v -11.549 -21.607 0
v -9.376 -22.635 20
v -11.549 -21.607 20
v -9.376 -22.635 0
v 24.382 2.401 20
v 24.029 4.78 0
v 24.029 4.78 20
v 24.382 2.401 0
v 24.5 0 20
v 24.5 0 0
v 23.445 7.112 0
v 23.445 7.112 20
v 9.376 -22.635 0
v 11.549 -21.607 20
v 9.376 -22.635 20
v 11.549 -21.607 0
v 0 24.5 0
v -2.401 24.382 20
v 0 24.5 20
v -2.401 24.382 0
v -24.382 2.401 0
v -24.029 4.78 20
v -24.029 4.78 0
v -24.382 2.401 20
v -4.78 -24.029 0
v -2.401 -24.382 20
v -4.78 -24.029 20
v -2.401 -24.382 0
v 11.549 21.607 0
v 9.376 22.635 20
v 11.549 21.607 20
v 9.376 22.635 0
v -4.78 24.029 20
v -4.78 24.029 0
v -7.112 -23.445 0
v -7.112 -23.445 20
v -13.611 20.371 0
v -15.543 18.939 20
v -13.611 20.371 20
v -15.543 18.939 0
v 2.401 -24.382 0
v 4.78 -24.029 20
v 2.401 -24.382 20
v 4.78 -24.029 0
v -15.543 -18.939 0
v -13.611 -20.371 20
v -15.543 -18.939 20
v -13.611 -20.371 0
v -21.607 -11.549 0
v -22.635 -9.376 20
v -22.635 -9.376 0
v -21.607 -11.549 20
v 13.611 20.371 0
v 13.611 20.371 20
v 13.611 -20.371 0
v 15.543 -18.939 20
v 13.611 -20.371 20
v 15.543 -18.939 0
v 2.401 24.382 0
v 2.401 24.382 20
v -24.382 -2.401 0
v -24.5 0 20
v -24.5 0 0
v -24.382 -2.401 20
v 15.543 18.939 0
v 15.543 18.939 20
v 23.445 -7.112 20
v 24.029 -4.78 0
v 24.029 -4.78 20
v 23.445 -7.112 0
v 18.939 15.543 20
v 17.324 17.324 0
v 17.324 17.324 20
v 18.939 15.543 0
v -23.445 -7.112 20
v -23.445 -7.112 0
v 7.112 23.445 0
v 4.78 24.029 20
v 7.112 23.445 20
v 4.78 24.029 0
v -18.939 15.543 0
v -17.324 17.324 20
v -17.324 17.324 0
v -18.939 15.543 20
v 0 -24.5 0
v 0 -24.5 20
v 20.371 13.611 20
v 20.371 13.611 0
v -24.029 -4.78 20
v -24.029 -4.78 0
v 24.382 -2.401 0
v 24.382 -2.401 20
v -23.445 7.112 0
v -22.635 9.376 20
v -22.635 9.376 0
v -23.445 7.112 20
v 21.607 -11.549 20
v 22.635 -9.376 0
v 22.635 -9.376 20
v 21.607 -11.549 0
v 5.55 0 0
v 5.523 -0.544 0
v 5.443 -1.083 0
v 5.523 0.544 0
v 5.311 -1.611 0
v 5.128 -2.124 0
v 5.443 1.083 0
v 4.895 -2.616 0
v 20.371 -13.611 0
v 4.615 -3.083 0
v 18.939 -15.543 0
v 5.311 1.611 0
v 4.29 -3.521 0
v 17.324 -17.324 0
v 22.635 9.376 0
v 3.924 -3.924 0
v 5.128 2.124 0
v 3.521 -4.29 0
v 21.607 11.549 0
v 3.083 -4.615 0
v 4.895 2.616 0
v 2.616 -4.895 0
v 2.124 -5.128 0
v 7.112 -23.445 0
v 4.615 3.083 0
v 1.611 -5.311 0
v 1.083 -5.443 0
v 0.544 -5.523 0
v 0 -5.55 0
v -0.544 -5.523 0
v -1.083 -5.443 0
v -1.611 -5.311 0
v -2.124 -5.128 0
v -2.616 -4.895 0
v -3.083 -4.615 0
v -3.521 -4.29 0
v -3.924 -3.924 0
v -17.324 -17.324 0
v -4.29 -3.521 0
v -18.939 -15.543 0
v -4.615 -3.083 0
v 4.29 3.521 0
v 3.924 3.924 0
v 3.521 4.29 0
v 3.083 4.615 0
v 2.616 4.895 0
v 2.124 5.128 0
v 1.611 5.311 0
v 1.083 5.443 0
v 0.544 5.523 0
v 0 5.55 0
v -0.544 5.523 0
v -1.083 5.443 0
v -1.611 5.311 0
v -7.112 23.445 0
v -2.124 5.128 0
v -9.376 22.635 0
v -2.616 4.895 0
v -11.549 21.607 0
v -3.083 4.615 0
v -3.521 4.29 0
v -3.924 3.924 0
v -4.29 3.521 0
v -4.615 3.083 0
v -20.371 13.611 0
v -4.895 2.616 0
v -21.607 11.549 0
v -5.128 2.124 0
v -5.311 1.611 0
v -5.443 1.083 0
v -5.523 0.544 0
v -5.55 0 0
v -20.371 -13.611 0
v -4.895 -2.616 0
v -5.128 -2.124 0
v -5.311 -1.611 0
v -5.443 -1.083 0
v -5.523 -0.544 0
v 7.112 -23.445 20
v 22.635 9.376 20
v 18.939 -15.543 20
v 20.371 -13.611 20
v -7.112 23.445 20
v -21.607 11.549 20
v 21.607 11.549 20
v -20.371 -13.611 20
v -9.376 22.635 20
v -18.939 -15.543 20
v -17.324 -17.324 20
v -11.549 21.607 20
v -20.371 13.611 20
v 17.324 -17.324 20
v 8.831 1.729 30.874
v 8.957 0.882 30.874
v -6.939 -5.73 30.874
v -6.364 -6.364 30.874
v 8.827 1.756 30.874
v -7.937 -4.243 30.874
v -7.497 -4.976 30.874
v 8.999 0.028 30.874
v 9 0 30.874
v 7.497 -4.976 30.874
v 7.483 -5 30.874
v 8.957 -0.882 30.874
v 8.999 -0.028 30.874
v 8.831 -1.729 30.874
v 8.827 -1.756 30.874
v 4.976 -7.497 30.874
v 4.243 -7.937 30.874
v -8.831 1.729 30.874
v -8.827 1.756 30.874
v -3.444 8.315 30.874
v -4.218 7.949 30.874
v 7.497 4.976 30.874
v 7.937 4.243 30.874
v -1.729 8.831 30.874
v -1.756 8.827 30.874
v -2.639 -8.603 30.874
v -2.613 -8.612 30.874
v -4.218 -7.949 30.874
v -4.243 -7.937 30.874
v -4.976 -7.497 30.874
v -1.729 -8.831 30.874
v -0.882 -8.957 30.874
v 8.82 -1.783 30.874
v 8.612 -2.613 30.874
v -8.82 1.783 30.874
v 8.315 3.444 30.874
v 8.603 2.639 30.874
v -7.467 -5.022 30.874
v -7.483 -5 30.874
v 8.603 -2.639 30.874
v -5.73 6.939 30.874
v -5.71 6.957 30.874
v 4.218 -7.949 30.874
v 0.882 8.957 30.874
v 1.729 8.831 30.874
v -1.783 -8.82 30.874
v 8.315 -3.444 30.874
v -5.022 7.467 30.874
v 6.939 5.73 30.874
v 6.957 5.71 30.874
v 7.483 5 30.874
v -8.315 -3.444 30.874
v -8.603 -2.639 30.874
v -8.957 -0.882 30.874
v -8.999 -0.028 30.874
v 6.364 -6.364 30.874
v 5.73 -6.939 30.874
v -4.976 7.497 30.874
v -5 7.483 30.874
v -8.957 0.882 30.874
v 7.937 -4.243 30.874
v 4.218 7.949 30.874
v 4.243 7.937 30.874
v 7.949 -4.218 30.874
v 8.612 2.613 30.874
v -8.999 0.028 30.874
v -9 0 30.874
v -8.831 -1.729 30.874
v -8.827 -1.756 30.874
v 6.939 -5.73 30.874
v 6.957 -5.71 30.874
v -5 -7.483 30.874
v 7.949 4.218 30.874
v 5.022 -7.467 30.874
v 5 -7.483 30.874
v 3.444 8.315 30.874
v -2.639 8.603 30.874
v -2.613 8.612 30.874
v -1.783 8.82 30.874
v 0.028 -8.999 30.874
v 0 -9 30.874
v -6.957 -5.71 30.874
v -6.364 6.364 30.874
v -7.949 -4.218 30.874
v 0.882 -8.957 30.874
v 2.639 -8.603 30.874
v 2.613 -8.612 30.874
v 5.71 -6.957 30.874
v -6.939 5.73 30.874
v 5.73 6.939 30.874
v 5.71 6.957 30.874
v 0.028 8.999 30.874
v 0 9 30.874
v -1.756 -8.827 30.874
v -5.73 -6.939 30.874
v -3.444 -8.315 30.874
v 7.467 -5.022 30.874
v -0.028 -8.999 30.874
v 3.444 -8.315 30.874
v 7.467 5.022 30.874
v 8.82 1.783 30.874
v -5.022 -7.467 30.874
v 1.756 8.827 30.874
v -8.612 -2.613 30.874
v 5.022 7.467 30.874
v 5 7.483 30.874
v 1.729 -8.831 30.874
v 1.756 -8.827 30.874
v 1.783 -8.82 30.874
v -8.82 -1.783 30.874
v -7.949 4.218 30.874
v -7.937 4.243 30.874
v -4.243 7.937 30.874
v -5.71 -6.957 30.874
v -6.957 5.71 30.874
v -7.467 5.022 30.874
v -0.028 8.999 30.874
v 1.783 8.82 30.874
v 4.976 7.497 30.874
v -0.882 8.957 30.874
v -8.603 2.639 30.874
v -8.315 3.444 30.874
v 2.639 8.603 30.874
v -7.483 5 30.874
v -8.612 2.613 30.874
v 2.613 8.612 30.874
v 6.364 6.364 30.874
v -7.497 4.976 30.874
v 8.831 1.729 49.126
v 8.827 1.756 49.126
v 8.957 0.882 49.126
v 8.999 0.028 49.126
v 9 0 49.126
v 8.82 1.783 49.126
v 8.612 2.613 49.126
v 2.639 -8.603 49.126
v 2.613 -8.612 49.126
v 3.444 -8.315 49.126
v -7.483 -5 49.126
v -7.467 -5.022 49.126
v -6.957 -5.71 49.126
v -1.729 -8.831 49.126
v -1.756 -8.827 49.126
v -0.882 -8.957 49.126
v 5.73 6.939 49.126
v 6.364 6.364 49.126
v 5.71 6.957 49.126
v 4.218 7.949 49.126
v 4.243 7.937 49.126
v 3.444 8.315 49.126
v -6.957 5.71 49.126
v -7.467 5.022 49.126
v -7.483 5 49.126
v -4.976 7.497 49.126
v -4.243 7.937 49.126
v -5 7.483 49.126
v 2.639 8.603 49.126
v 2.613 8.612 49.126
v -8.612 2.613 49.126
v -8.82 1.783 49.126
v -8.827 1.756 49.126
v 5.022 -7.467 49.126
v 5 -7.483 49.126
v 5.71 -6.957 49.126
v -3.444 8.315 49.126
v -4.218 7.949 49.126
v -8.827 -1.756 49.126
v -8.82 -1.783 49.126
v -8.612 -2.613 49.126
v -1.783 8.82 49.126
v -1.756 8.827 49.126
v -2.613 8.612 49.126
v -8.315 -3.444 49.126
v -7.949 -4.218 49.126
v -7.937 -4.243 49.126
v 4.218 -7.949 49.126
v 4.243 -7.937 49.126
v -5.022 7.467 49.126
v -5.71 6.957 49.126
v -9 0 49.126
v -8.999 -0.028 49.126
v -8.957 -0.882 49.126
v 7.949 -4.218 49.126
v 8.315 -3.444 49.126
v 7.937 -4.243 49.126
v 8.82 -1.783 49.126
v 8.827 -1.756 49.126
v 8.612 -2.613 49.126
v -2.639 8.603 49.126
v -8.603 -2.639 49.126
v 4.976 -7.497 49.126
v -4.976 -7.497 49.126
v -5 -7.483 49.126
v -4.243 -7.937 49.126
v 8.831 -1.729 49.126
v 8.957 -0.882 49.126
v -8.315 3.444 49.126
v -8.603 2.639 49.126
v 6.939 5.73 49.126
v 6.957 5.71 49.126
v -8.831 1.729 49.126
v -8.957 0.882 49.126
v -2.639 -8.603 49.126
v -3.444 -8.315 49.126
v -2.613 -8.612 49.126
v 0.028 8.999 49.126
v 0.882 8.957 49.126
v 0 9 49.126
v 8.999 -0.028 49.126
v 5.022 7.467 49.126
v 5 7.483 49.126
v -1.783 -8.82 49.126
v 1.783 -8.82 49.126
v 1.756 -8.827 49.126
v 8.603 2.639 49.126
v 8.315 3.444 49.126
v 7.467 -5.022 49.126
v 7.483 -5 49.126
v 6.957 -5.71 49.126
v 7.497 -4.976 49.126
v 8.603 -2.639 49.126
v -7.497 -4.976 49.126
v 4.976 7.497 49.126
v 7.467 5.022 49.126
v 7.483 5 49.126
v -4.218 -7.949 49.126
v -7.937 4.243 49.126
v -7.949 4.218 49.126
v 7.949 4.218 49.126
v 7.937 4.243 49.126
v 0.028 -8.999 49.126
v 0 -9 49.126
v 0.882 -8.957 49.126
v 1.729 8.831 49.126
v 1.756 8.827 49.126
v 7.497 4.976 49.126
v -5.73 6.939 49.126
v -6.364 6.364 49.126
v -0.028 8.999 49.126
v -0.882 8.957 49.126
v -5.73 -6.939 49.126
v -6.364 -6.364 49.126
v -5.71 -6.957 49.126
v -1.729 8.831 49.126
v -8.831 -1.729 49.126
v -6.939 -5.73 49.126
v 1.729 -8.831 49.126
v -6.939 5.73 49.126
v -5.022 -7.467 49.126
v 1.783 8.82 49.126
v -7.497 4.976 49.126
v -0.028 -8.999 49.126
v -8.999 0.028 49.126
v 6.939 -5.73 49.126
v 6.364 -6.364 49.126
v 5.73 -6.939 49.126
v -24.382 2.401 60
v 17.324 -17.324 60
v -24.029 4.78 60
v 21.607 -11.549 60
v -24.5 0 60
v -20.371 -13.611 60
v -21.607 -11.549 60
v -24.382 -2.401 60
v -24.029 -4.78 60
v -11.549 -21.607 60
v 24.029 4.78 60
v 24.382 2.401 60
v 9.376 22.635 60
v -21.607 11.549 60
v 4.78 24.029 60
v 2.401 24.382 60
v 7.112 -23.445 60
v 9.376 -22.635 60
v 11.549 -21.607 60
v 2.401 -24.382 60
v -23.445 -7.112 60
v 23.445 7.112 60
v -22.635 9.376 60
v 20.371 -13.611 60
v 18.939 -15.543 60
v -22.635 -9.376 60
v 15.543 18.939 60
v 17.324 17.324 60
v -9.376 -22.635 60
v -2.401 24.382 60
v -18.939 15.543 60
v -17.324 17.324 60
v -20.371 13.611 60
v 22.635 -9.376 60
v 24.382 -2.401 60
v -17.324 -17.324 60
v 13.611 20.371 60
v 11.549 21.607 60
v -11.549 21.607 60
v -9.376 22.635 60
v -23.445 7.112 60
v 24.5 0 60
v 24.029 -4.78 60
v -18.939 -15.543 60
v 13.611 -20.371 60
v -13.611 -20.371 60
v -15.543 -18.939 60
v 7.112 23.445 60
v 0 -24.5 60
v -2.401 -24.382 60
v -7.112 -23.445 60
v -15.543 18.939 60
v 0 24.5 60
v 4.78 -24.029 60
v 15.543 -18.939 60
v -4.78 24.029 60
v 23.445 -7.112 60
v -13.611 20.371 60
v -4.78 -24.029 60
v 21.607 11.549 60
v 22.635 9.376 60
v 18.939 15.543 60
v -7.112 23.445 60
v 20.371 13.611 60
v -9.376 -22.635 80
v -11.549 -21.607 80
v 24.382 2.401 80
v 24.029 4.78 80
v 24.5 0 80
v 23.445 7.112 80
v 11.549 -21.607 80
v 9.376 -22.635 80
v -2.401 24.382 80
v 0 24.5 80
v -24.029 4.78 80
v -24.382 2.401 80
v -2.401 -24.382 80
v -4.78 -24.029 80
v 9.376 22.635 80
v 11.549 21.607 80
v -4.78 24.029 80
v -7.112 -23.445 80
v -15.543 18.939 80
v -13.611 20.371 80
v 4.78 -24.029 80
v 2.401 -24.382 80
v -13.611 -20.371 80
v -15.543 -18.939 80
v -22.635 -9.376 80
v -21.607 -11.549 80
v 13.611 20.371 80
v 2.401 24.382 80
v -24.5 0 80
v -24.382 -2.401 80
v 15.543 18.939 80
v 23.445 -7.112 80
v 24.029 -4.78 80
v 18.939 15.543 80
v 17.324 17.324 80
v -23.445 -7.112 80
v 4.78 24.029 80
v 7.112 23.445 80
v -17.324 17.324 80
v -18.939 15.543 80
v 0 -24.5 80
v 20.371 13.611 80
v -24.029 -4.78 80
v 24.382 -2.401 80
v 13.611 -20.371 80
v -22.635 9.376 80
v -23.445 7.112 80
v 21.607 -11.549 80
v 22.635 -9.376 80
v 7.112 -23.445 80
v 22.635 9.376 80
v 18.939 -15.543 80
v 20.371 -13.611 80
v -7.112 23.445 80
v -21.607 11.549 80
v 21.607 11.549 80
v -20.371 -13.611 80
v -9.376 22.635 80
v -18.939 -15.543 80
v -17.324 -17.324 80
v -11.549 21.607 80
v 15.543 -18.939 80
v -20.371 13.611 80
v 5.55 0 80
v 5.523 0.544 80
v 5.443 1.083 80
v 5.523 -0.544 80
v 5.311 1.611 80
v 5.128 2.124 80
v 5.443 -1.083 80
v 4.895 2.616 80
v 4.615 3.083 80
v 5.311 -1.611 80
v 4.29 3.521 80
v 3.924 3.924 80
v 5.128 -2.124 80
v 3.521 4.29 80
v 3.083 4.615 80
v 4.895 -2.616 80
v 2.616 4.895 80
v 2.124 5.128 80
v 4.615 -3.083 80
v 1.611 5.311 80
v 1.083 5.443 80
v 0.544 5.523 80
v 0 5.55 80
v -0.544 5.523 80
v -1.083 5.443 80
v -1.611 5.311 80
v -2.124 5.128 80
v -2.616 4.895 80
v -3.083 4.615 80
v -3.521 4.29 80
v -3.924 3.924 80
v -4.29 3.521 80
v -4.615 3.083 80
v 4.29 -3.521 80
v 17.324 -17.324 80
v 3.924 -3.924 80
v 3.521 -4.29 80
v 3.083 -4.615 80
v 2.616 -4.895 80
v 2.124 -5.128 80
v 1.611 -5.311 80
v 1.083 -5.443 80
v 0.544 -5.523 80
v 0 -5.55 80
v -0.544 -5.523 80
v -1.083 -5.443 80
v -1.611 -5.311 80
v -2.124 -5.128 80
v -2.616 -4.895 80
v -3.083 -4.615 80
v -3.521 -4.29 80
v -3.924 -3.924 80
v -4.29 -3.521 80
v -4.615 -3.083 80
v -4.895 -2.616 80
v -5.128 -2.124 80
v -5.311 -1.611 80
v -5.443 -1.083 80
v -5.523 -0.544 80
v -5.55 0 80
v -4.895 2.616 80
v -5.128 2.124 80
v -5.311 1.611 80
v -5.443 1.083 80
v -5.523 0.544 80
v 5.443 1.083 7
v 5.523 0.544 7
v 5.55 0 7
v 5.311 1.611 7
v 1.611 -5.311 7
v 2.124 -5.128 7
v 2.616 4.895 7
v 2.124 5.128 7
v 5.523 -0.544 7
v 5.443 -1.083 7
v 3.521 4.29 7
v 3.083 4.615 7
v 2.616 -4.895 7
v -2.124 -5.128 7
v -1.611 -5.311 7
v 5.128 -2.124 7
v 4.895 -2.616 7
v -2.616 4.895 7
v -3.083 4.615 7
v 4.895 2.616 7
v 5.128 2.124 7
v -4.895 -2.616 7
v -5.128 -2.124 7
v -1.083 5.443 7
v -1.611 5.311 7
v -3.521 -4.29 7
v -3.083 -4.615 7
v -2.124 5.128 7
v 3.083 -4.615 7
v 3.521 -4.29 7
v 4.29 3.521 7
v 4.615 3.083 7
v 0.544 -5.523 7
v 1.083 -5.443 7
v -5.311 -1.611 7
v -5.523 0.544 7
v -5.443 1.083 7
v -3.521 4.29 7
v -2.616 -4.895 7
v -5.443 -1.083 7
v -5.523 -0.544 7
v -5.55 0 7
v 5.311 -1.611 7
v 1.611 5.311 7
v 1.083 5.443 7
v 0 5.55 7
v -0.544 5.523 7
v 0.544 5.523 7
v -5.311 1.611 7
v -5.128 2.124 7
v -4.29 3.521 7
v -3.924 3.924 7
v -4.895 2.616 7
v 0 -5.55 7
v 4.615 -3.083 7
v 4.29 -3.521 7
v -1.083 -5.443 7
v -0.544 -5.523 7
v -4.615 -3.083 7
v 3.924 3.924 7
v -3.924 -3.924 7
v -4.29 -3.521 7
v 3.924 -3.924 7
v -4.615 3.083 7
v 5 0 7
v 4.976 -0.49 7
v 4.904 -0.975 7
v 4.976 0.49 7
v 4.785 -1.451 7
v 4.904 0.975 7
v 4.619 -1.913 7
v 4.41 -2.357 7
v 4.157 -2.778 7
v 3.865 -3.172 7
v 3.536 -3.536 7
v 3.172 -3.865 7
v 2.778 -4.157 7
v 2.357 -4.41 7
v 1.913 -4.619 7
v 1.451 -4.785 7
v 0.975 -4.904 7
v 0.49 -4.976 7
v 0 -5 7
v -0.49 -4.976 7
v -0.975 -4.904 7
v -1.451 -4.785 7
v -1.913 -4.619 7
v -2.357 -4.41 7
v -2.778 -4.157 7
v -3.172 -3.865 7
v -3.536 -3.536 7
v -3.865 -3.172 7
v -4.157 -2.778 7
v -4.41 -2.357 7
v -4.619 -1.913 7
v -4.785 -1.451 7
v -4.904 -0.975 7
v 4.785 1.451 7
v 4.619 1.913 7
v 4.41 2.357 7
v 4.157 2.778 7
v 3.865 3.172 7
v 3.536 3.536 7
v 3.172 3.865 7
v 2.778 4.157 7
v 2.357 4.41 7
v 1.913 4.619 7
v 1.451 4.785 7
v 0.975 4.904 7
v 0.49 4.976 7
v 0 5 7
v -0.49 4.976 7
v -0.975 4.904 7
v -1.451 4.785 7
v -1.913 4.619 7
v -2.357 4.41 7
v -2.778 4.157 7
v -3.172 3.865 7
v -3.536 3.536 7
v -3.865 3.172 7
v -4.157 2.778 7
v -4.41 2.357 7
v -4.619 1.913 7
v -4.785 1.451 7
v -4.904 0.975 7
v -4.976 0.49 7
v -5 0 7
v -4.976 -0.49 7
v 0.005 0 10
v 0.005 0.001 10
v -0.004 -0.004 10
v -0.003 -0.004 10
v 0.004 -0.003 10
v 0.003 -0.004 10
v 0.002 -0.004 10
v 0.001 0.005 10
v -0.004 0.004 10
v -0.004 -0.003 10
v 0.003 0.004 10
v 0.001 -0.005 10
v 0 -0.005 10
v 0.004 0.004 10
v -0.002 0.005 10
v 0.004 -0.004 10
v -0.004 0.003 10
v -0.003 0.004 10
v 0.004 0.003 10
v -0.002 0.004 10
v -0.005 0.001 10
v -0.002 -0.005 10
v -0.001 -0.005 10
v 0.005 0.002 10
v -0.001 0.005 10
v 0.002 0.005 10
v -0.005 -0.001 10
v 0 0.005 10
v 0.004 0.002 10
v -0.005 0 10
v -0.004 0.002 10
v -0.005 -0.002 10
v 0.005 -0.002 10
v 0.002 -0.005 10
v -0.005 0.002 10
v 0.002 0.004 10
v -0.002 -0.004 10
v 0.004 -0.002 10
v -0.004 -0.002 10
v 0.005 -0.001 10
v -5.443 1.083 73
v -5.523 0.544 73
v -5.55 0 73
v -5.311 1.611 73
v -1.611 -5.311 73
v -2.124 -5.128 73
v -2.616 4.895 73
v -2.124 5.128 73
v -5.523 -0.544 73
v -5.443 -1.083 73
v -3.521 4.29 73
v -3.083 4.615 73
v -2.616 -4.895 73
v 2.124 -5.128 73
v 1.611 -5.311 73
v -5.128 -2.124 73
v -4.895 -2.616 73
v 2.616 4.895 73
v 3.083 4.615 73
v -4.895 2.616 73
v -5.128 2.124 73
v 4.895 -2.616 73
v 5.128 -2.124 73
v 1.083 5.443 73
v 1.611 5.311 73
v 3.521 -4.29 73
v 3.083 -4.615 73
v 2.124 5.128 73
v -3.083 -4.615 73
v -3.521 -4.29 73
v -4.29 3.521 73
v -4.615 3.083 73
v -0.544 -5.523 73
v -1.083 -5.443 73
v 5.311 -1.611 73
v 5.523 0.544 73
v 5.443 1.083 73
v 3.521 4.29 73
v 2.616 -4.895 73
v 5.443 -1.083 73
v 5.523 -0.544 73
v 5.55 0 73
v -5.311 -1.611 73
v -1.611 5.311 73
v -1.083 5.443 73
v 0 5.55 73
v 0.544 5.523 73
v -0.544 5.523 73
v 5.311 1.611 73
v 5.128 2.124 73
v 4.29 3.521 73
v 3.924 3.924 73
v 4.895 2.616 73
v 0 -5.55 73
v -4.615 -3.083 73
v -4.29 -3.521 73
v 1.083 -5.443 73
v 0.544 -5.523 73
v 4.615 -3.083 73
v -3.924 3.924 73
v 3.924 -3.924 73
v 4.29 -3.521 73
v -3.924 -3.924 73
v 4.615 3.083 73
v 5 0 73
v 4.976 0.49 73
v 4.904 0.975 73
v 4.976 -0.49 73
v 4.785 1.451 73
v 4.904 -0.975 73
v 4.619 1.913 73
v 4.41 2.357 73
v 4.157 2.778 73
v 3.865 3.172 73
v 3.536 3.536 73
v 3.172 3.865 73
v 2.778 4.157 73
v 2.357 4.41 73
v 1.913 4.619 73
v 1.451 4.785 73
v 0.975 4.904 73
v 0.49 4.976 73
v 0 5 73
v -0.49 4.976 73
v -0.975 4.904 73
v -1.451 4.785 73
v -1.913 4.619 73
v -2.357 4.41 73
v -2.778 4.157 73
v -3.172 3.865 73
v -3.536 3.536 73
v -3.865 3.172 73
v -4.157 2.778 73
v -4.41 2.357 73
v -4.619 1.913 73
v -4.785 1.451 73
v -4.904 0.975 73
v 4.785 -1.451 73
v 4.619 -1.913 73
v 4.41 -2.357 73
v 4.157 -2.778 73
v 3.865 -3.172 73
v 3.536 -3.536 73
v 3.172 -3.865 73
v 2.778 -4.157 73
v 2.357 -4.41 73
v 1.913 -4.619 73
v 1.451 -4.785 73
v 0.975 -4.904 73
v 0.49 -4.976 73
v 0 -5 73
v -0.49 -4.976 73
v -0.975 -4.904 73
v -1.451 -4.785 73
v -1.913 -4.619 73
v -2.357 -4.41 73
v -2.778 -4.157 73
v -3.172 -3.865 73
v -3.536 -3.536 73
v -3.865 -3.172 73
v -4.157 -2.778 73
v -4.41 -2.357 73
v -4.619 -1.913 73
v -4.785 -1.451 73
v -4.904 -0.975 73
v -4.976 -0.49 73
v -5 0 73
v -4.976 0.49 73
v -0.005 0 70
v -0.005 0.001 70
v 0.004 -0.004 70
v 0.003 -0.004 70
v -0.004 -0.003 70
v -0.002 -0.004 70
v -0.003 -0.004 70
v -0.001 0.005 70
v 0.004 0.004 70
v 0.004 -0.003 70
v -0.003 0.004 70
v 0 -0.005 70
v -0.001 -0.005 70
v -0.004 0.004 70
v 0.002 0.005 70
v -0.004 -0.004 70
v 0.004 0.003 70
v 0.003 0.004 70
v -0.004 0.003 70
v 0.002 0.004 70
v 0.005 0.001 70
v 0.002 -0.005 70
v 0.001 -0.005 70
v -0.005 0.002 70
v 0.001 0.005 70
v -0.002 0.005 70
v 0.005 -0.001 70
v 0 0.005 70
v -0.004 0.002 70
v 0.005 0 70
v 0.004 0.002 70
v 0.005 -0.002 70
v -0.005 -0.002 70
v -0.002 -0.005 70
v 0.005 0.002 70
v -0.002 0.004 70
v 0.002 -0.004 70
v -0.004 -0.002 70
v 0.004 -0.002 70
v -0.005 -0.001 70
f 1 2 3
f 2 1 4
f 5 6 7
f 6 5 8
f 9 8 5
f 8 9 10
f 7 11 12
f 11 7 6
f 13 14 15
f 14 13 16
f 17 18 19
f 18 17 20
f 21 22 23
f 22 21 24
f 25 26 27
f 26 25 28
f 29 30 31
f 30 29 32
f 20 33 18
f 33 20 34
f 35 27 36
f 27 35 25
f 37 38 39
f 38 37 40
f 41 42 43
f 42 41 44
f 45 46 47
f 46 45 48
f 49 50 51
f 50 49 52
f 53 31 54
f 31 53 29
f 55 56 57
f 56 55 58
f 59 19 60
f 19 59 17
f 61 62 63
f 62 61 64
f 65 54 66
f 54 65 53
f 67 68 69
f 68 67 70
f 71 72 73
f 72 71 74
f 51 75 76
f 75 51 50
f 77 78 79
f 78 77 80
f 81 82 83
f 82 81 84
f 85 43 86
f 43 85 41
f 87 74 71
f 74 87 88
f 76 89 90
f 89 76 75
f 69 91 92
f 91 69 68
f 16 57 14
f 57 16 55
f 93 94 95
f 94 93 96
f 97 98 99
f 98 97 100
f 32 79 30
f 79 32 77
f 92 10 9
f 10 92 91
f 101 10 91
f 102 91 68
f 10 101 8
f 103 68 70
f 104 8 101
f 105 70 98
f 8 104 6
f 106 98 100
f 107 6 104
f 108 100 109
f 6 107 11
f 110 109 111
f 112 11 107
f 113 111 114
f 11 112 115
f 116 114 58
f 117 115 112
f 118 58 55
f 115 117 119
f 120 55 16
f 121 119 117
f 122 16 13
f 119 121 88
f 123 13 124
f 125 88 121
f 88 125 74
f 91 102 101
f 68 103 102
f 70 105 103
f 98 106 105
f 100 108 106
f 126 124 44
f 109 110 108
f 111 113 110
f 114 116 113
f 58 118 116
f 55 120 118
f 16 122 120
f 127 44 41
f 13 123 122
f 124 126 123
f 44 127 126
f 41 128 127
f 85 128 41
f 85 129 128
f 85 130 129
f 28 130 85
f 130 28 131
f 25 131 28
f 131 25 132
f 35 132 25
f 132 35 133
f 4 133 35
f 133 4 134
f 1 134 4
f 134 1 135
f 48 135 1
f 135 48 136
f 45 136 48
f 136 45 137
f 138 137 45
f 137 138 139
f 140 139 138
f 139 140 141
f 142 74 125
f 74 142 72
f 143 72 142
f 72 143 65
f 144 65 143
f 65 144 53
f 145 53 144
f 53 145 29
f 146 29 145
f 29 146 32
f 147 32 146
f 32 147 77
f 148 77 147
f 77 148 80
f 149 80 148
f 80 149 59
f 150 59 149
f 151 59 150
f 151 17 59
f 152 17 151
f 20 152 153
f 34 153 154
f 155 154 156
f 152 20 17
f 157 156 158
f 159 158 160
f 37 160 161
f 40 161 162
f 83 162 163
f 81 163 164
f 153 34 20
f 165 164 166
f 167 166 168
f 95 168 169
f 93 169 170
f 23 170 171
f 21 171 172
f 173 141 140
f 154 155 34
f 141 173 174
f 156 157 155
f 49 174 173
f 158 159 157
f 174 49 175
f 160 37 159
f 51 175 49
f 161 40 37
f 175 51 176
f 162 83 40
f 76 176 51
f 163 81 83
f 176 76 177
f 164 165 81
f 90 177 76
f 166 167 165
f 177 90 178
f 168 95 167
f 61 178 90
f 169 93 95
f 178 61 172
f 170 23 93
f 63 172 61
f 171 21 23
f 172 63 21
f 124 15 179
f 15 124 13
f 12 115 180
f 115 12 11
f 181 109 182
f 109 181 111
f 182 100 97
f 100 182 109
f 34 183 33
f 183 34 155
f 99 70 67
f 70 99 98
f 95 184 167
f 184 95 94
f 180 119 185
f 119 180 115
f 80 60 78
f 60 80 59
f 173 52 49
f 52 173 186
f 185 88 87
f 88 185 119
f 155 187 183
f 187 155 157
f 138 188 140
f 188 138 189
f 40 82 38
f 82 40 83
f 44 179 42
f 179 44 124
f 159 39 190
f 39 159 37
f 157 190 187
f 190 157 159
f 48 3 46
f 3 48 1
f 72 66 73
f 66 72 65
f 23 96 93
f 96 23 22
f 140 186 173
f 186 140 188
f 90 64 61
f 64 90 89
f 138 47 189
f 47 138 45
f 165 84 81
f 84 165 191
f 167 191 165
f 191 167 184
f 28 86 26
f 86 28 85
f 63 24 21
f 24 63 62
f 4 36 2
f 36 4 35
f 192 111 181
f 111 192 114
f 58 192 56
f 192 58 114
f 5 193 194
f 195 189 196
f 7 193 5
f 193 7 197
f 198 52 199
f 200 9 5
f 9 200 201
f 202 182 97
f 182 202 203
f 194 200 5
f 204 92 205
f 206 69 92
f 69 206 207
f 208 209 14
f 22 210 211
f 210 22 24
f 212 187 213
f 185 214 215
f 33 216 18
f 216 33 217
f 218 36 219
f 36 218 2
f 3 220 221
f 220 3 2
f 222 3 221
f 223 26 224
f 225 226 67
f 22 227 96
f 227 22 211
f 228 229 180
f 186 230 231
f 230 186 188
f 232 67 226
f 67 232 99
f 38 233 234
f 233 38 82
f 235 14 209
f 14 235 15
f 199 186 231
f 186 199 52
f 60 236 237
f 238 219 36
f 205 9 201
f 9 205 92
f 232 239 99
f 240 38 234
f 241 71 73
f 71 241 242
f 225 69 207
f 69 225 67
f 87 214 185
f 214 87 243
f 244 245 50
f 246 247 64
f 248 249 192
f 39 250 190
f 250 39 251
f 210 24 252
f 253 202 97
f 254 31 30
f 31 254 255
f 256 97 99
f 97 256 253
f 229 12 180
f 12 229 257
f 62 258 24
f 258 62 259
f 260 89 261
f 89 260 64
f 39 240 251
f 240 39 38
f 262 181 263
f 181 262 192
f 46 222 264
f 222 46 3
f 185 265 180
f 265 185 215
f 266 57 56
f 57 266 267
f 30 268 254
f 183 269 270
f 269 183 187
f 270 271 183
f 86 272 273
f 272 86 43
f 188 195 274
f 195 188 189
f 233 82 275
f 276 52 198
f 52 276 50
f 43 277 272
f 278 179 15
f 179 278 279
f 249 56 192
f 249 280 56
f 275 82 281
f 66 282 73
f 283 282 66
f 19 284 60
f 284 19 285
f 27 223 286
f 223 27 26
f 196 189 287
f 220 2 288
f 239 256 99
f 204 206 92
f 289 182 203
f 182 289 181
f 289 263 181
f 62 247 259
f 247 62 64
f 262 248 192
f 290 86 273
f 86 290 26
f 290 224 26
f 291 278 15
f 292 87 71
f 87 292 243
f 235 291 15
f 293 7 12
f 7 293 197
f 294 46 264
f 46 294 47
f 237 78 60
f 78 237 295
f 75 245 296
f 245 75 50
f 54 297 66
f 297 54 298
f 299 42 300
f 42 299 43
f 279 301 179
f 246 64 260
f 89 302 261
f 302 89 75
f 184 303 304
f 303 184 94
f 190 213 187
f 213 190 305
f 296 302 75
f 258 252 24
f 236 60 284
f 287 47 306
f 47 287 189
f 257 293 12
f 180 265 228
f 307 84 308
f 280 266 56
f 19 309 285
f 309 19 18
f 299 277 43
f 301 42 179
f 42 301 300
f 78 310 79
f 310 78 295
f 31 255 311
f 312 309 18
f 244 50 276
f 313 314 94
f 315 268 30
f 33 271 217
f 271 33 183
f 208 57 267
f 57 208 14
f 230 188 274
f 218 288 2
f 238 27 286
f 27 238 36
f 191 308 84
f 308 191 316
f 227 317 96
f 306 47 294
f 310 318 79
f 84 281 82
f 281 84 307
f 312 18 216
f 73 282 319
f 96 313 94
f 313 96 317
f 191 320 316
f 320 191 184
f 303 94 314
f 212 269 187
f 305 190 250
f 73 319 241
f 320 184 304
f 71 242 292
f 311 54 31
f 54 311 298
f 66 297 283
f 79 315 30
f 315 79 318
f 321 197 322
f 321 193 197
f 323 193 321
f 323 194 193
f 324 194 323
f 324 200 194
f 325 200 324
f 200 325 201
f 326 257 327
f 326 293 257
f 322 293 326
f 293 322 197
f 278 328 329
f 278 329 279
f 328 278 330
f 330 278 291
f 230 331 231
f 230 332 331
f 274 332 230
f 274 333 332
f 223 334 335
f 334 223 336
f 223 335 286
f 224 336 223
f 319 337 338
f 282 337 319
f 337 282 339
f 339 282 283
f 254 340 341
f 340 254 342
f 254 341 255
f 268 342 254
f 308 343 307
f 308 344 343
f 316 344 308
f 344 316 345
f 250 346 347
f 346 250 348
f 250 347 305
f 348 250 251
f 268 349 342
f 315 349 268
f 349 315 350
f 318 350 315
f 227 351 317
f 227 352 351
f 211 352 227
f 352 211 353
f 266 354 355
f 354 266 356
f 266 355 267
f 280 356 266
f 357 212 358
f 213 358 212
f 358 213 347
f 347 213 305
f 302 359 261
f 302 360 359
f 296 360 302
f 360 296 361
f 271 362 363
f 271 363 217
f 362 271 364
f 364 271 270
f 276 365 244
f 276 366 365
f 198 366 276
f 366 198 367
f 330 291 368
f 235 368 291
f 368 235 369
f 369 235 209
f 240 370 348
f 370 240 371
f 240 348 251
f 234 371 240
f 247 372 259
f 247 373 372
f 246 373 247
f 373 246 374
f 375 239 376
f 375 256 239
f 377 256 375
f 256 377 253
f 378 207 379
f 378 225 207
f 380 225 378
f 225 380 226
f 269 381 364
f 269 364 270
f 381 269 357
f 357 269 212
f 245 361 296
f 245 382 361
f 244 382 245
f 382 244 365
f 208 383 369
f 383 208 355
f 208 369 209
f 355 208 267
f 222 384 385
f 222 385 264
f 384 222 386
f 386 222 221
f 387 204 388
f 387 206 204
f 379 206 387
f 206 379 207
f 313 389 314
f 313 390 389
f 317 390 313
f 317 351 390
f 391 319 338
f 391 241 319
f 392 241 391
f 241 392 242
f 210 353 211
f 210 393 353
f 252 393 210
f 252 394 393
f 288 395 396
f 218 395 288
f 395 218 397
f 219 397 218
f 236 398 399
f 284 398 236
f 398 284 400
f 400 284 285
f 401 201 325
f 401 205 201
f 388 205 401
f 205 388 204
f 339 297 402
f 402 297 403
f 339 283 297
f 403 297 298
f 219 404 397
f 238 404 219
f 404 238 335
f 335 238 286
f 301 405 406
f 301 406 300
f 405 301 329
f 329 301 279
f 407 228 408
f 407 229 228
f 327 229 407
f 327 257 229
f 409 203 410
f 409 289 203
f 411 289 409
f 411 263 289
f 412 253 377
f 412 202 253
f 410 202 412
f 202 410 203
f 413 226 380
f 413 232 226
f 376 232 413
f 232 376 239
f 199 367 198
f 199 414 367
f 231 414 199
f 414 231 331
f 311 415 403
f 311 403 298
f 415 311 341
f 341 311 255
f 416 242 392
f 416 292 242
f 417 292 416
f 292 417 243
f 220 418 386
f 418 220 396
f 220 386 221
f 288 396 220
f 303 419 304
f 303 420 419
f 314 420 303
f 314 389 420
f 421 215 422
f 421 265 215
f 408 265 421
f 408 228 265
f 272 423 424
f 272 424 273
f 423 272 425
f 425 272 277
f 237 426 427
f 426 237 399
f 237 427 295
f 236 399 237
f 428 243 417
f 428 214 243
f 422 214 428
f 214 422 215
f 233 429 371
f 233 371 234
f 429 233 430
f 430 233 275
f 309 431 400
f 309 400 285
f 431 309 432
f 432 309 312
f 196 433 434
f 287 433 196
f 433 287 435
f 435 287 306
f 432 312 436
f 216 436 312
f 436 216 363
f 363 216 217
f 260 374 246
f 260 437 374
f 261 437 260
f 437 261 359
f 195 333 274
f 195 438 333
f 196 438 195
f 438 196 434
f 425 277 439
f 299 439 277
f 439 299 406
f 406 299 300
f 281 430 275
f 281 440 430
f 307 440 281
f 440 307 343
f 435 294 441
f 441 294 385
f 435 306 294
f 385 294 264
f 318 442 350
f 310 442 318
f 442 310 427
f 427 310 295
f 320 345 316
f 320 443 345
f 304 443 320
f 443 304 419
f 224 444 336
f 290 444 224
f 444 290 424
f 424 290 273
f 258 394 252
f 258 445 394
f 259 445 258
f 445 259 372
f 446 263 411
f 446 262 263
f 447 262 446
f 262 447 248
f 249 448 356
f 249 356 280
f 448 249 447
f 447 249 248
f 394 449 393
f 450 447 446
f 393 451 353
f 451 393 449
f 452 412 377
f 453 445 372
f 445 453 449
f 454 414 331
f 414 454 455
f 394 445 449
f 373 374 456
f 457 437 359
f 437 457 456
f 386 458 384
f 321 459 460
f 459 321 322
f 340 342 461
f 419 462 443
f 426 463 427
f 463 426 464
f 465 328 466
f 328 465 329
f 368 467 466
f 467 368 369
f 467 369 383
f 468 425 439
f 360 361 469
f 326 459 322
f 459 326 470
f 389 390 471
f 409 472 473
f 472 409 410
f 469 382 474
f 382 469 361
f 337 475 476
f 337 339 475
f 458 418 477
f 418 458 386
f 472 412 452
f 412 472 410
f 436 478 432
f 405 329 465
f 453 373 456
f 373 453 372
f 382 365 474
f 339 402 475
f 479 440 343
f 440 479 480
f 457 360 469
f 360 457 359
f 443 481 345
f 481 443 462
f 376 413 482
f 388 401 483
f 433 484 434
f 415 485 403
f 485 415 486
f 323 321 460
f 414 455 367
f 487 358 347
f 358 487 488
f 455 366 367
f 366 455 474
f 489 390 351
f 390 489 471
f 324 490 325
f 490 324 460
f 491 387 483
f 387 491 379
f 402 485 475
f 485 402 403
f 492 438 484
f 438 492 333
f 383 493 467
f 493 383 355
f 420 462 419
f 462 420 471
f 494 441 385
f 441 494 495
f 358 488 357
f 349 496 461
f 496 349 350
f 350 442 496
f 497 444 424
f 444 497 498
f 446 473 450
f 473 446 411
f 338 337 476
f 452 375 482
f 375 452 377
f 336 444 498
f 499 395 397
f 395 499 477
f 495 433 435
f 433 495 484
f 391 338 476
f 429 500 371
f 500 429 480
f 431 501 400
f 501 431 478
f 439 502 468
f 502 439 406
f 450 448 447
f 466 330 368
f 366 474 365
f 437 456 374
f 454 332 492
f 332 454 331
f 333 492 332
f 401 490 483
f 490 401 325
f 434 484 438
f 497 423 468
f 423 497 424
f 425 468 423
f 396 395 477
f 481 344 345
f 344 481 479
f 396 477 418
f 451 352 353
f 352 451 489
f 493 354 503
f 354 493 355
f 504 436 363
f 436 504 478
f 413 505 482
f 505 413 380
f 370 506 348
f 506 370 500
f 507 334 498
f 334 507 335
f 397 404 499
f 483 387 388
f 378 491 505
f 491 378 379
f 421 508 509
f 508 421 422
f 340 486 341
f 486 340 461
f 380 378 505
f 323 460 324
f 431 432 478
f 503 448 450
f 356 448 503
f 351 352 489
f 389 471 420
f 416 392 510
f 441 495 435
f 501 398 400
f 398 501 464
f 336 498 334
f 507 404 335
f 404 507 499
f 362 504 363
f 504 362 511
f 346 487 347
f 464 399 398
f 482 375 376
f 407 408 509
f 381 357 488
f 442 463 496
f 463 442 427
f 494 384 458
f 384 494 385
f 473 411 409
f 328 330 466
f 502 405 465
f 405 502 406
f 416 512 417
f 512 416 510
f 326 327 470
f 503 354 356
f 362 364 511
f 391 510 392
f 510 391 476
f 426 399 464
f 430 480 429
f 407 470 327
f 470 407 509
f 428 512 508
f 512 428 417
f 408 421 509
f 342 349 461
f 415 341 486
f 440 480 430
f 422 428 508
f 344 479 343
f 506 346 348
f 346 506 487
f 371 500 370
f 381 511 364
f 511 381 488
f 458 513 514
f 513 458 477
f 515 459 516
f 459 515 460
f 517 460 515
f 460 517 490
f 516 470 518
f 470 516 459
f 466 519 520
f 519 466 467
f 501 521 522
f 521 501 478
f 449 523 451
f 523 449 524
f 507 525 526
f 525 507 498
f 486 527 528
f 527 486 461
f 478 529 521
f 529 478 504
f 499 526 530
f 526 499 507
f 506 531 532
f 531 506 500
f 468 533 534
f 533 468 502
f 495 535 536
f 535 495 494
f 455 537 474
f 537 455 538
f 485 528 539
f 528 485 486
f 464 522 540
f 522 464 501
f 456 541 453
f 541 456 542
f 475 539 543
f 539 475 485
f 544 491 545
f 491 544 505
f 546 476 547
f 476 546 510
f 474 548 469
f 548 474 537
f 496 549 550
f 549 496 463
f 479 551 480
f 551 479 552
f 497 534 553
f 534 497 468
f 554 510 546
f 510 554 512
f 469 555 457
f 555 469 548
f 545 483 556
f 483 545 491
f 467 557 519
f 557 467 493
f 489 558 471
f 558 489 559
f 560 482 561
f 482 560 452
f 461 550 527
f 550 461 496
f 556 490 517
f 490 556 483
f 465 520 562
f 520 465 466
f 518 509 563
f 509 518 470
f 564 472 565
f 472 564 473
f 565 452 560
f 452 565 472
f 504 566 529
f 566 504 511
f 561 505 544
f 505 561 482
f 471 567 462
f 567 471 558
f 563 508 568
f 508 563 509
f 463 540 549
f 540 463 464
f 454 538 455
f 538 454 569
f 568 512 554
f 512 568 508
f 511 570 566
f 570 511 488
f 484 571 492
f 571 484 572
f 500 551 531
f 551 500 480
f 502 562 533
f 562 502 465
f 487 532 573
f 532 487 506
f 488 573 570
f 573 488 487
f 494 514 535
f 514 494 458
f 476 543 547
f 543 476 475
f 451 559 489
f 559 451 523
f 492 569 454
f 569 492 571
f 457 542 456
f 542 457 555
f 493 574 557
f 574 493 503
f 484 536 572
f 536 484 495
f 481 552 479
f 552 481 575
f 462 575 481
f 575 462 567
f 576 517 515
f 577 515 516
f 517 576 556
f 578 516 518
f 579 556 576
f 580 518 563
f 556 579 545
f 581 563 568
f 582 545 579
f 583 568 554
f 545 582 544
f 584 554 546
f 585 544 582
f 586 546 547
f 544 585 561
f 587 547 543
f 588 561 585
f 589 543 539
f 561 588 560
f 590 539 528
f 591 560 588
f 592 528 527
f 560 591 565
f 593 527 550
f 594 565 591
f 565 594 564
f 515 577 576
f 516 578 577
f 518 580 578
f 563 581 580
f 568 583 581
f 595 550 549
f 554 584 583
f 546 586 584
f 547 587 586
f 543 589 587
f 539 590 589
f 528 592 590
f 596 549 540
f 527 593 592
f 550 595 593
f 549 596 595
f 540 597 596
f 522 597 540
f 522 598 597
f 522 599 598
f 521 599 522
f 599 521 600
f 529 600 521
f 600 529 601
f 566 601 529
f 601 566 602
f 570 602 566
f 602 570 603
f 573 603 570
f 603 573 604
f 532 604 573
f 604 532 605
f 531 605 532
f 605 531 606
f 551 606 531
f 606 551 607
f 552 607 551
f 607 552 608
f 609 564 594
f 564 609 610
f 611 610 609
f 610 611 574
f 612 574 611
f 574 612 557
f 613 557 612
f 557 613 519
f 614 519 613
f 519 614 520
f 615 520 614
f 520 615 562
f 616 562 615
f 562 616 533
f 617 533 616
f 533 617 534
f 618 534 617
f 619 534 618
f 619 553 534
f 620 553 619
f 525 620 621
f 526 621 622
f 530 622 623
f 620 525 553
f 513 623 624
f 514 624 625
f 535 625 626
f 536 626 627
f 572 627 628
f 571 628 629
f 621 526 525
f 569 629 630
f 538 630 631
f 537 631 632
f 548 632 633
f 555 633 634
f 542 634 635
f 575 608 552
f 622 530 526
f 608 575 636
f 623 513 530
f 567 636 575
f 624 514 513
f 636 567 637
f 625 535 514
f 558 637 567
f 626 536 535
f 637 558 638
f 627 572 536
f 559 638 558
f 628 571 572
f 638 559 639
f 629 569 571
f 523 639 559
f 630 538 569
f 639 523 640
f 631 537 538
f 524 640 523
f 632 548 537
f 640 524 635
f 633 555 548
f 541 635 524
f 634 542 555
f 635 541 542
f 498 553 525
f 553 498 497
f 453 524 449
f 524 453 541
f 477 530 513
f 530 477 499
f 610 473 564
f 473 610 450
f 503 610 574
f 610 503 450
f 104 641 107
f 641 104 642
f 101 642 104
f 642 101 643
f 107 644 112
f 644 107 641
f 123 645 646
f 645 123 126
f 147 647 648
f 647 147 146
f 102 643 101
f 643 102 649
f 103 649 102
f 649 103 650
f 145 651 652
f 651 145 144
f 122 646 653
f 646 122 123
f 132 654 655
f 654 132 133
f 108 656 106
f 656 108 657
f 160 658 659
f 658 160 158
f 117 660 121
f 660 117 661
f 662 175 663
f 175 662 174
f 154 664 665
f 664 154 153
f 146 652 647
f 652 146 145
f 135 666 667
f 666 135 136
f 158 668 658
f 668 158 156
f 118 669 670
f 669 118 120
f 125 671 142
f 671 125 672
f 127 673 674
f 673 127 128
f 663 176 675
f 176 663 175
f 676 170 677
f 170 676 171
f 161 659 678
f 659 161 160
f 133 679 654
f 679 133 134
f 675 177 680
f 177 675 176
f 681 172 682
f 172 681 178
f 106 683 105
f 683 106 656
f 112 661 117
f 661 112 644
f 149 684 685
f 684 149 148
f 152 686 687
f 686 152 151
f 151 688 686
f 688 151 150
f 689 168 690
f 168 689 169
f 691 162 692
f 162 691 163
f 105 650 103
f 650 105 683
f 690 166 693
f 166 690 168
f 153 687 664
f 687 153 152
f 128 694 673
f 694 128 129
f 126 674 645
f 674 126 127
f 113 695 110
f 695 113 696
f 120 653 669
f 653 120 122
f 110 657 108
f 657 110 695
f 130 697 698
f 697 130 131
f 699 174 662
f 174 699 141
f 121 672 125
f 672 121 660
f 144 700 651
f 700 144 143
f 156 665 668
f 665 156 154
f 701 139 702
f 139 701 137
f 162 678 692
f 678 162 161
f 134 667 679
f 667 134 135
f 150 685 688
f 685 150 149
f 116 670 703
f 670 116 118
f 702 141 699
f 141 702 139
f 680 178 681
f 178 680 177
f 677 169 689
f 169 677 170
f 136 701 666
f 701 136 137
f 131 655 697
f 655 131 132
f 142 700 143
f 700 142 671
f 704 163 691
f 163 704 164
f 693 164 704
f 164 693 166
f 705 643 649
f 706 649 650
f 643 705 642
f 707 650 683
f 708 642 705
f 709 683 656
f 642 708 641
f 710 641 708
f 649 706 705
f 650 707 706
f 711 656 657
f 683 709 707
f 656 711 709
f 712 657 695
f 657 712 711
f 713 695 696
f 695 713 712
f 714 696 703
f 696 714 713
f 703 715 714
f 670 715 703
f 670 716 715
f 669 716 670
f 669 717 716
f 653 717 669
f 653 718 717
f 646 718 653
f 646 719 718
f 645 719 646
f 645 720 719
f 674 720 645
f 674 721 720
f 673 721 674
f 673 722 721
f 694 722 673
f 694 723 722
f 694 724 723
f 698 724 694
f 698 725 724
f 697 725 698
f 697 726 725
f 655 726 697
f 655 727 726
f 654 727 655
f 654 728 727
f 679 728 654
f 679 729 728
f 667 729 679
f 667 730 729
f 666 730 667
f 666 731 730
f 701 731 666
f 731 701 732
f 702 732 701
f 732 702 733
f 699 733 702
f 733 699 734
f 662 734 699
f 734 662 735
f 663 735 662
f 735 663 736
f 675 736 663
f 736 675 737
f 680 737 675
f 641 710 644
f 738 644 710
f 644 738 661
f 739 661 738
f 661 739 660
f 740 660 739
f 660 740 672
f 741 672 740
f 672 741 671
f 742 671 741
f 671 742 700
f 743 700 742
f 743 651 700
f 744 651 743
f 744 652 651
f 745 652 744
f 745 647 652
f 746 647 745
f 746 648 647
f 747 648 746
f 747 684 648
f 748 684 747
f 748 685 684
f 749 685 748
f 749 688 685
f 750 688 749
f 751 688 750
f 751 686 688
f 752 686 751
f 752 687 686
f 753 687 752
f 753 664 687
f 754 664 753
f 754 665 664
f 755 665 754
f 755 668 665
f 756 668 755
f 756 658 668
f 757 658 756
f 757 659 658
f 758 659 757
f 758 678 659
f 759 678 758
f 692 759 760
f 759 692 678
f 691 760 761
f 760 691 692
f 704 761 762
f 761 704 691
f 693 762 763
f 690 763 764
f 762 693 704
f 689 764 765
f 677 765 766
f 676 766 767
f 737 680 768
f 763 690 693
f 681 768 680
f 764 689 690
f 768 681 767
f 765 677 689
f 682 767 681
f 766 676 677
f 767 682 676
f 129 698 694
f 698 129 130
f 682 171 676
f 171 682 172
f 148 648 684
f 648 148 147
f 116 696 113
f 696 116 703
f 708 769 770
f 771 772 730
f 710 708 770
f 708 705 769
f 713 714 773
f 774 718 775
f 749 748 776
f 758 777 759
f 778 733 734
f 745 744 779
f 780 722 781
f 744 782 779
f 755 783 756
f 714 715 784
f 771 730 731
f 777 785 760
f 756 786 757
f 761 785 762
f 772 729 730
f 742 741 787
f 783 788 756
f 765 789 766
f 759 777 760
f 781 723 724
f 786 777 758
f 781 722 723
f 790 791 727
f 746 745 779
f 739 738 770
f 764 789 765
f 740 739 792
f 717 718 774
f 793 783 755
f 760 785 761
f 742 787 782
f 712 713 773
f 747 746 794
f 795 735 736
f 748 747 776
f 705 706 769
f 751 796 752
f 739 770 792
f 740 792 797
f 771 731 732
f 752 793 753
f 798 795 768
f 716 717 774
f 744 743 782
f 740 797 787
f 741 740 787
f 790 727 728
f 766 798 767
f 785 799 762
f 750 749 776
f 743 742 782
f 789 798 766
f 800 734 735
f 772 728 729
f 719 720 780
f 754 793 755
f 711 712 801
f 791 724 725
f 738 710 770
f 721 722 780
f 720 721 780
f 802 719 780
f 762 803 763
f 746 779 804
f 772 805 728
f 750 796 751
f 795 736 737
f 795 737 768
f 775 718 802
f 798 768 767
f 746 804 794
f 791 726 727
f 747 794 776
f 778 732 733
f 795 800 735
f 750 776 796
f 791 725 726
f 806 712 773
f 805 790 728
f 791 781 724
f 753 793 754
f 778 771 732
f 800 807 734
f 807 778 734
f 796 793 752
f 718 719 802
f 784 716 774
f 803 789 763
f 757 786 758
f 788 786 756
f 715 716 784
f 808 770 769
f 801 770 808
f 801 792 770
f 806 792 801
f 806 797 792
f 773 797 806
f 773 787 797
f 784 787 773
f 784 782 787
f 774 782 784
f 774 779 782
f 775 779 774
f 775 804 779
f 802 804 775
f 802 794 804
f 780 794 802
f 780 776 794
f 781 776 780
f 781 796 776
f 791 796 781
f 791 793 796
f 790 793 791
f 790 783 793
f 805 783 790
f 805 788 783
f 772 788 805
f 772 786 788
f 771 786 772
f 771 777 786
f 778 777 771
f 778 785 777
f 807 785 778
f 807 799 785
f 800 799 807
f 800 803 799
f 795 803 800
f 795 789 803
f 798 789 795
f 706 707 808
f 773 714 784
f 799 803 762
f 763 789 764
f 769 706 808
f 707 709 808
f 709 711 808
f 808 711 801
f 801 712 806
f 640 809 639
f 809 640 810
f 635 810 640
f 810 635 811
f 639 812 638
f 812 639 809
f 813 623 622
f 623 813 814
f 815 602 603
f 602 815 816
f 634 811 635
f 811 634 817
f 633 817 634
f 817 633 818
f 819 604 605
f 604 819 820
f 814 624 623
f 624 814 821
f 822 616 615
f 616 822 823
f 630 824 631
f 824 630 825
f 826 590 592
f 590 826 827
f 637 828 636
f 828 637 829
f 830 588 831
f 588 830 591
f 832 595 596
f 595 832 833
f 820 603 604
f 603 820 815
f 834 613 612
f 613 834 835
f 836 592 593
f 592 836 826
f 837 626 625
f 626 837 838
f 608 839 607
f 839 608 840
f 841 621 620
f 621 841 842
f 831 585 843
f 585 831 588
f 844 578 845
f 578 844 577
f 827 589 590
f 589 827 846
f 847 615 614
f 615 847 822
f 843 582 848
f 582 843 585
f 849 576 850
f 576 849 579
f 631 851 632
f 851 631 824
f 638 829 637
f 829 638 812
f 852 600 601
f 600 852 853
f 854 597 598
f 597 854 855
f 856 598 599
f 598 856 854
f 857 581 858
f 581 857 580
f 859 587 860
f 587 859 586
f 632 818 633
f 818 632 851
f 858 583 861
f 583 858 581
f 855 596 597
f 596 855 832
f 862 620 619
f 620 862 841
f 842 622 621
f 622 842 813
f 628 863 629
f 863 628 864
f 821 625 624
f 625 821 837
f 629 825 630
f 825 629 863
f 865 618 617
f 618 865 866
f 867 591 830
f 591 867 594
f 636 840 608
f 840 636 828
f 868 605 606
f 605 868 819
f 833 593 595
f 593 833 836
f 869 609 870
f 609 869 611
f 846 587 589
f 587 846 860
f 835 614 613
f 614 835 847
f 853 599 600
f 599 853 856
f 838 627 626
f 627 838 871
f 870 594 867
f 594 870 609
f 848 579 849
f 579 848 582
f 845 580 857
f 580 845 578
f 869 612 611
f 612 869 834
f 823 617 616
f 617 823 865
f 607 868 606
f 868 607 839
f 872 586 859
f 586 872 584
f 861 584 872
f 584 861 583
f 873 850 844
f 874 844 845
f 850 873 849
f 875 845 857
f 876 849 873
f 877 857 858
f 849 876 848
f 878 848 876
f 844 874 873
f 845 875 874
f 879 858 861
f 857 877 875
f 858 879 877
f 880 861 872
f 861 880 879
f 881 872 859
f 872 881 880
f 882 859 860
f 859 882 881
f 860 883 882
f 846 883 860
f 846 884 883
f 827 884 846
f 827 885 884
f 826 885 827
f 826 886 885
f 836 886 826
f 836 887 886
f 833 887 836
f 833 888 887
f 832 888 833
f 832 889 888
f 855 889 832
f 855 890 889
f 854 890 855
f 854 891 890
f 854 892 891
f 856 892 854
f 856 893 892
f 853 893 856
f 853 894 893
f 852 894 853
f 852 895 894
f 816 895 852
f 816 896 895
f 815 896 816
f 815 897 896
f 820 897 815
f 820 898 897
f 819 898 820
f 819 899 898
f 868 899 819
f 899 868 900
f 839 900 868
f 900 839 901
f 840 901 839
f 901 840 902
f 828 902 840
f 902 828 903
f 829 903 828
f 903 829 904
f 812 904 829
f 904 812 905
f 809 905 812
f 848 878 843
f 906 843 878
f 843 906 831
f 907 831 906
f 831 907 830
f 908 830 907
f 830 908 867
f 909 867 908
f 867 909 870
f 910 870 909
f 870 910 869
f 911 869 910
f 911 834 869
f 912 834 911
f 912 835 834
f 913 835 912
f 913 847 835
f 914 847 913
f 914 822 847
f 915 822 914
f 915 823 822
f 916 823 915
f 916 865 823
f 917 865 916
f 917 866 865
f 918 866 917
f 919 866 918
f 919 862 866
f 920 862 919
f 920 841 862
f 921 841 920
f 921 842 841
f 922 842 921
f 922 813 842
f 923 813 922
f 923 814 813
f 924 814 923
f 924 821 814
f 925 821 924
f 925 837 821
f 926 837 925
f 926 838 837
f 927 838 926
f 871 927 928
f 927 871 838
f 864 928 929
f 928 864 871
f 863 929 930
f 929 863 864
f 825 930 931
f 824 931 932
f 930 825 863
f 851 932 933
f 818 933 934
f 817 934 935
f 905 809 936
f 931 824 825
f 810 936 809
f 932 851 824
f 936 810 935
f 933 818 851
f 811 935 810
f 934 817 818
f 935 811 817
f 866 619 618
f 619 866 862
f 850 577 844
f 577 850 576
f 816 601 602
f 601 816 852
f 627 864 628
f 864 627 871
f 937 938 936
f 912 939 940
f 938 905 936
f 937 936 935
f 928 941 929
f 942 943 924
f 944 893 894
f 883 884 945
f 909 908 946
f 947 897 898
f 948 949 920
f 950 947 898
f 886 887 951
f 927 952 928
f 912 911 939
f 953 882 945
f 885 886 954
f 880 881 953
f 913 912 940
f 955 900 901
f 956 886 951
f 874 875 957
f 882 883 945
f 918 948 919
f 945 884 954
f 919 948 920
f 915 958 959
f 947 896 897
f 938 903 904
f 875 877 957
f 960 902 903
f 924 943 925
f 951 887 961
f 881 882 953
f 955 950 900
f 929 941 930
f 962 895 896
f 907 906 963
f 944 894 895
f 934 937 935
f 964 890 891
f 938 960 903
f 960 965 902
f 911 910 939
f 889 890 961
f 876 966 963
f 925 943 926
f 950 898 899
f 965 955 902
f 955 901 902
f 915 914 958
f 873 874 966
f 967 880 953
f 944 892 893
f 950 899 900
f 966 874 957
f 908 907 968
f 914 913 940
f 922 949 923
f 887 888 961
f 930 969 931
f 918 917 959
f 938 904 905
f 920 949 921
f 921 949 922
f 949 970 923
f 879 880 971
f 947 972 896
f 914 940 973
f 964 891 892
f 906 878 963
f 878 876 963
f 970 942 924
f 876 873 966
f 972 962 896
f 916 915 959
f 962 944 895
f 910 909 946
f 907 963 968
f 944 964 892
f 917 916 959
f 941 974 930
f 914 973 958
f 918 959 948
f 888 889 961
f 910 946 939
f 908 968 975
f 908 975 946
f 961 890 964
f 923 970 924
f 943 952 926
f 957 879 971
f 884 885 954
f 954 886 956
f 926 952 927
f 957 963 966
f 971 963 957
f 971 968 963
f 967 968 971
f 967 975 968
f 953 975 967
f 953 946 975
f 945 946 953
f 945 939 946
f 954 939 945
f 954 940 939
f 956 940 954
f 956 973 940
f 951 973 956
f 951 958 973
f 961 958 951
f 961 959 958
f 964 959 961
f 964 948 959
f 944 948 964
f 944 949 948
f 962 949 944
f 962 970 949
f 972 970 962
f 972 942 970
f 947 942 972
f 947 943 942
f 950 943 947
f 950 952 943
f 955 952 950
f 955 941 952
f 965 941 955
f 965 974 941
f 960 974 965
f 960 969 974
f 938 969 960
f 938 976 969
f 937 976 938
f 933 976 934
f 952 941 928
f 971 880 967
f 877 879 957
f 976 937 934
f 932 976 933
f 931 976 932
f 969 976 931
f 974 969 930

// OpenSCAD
$fn=64;

CLEARANCE=0.1;

difference()
{
    union()
    {
        cylinder(h = 20, d = 49);
        translate([0, 0, 20])
        {
            linear_extrude(height=11, scale=[0.36, 0.36])
            {
                circle(d = 49);
            }
        }
        translate([0, 0, 30]) cylinder(h = 20, d = 18);

        translate([0, 0, 60]) rotate([0, 180, 0])
        {
            linear_extrude(height=11, scale=[0.36, 0.36])
            {
                circle(d = 49);
            }
        }
        translate([0, 0, 60]) cylinder(h = 20, d = 49);
    }

    union()
    {
        translate([0, 0, -CLEARANCE])
        {
            union()
            {
                cylinder(d = 11.1, h = (7 + CLEARANCE));
                translate([0, 0, 7 + CLEARANCE]) linear_extrude(height=3, scale=[0.001, 0.001])
                {
                    circle(d = 10);
                }
            }
        }

        translate([0, 0, 80 + CLEARANCE]) rotate([0, 180, 0])
        {
            union()
            {
                cylinder(d = 11.1, h = (7 + CLEARANCE));
                translate([0, 0, 7 + CLEARANCE]) linear_extrude(height=3, scale=[0.001, 0.001])
                {
                    circle(d = 10);
                }
            }
        }
    }

}
